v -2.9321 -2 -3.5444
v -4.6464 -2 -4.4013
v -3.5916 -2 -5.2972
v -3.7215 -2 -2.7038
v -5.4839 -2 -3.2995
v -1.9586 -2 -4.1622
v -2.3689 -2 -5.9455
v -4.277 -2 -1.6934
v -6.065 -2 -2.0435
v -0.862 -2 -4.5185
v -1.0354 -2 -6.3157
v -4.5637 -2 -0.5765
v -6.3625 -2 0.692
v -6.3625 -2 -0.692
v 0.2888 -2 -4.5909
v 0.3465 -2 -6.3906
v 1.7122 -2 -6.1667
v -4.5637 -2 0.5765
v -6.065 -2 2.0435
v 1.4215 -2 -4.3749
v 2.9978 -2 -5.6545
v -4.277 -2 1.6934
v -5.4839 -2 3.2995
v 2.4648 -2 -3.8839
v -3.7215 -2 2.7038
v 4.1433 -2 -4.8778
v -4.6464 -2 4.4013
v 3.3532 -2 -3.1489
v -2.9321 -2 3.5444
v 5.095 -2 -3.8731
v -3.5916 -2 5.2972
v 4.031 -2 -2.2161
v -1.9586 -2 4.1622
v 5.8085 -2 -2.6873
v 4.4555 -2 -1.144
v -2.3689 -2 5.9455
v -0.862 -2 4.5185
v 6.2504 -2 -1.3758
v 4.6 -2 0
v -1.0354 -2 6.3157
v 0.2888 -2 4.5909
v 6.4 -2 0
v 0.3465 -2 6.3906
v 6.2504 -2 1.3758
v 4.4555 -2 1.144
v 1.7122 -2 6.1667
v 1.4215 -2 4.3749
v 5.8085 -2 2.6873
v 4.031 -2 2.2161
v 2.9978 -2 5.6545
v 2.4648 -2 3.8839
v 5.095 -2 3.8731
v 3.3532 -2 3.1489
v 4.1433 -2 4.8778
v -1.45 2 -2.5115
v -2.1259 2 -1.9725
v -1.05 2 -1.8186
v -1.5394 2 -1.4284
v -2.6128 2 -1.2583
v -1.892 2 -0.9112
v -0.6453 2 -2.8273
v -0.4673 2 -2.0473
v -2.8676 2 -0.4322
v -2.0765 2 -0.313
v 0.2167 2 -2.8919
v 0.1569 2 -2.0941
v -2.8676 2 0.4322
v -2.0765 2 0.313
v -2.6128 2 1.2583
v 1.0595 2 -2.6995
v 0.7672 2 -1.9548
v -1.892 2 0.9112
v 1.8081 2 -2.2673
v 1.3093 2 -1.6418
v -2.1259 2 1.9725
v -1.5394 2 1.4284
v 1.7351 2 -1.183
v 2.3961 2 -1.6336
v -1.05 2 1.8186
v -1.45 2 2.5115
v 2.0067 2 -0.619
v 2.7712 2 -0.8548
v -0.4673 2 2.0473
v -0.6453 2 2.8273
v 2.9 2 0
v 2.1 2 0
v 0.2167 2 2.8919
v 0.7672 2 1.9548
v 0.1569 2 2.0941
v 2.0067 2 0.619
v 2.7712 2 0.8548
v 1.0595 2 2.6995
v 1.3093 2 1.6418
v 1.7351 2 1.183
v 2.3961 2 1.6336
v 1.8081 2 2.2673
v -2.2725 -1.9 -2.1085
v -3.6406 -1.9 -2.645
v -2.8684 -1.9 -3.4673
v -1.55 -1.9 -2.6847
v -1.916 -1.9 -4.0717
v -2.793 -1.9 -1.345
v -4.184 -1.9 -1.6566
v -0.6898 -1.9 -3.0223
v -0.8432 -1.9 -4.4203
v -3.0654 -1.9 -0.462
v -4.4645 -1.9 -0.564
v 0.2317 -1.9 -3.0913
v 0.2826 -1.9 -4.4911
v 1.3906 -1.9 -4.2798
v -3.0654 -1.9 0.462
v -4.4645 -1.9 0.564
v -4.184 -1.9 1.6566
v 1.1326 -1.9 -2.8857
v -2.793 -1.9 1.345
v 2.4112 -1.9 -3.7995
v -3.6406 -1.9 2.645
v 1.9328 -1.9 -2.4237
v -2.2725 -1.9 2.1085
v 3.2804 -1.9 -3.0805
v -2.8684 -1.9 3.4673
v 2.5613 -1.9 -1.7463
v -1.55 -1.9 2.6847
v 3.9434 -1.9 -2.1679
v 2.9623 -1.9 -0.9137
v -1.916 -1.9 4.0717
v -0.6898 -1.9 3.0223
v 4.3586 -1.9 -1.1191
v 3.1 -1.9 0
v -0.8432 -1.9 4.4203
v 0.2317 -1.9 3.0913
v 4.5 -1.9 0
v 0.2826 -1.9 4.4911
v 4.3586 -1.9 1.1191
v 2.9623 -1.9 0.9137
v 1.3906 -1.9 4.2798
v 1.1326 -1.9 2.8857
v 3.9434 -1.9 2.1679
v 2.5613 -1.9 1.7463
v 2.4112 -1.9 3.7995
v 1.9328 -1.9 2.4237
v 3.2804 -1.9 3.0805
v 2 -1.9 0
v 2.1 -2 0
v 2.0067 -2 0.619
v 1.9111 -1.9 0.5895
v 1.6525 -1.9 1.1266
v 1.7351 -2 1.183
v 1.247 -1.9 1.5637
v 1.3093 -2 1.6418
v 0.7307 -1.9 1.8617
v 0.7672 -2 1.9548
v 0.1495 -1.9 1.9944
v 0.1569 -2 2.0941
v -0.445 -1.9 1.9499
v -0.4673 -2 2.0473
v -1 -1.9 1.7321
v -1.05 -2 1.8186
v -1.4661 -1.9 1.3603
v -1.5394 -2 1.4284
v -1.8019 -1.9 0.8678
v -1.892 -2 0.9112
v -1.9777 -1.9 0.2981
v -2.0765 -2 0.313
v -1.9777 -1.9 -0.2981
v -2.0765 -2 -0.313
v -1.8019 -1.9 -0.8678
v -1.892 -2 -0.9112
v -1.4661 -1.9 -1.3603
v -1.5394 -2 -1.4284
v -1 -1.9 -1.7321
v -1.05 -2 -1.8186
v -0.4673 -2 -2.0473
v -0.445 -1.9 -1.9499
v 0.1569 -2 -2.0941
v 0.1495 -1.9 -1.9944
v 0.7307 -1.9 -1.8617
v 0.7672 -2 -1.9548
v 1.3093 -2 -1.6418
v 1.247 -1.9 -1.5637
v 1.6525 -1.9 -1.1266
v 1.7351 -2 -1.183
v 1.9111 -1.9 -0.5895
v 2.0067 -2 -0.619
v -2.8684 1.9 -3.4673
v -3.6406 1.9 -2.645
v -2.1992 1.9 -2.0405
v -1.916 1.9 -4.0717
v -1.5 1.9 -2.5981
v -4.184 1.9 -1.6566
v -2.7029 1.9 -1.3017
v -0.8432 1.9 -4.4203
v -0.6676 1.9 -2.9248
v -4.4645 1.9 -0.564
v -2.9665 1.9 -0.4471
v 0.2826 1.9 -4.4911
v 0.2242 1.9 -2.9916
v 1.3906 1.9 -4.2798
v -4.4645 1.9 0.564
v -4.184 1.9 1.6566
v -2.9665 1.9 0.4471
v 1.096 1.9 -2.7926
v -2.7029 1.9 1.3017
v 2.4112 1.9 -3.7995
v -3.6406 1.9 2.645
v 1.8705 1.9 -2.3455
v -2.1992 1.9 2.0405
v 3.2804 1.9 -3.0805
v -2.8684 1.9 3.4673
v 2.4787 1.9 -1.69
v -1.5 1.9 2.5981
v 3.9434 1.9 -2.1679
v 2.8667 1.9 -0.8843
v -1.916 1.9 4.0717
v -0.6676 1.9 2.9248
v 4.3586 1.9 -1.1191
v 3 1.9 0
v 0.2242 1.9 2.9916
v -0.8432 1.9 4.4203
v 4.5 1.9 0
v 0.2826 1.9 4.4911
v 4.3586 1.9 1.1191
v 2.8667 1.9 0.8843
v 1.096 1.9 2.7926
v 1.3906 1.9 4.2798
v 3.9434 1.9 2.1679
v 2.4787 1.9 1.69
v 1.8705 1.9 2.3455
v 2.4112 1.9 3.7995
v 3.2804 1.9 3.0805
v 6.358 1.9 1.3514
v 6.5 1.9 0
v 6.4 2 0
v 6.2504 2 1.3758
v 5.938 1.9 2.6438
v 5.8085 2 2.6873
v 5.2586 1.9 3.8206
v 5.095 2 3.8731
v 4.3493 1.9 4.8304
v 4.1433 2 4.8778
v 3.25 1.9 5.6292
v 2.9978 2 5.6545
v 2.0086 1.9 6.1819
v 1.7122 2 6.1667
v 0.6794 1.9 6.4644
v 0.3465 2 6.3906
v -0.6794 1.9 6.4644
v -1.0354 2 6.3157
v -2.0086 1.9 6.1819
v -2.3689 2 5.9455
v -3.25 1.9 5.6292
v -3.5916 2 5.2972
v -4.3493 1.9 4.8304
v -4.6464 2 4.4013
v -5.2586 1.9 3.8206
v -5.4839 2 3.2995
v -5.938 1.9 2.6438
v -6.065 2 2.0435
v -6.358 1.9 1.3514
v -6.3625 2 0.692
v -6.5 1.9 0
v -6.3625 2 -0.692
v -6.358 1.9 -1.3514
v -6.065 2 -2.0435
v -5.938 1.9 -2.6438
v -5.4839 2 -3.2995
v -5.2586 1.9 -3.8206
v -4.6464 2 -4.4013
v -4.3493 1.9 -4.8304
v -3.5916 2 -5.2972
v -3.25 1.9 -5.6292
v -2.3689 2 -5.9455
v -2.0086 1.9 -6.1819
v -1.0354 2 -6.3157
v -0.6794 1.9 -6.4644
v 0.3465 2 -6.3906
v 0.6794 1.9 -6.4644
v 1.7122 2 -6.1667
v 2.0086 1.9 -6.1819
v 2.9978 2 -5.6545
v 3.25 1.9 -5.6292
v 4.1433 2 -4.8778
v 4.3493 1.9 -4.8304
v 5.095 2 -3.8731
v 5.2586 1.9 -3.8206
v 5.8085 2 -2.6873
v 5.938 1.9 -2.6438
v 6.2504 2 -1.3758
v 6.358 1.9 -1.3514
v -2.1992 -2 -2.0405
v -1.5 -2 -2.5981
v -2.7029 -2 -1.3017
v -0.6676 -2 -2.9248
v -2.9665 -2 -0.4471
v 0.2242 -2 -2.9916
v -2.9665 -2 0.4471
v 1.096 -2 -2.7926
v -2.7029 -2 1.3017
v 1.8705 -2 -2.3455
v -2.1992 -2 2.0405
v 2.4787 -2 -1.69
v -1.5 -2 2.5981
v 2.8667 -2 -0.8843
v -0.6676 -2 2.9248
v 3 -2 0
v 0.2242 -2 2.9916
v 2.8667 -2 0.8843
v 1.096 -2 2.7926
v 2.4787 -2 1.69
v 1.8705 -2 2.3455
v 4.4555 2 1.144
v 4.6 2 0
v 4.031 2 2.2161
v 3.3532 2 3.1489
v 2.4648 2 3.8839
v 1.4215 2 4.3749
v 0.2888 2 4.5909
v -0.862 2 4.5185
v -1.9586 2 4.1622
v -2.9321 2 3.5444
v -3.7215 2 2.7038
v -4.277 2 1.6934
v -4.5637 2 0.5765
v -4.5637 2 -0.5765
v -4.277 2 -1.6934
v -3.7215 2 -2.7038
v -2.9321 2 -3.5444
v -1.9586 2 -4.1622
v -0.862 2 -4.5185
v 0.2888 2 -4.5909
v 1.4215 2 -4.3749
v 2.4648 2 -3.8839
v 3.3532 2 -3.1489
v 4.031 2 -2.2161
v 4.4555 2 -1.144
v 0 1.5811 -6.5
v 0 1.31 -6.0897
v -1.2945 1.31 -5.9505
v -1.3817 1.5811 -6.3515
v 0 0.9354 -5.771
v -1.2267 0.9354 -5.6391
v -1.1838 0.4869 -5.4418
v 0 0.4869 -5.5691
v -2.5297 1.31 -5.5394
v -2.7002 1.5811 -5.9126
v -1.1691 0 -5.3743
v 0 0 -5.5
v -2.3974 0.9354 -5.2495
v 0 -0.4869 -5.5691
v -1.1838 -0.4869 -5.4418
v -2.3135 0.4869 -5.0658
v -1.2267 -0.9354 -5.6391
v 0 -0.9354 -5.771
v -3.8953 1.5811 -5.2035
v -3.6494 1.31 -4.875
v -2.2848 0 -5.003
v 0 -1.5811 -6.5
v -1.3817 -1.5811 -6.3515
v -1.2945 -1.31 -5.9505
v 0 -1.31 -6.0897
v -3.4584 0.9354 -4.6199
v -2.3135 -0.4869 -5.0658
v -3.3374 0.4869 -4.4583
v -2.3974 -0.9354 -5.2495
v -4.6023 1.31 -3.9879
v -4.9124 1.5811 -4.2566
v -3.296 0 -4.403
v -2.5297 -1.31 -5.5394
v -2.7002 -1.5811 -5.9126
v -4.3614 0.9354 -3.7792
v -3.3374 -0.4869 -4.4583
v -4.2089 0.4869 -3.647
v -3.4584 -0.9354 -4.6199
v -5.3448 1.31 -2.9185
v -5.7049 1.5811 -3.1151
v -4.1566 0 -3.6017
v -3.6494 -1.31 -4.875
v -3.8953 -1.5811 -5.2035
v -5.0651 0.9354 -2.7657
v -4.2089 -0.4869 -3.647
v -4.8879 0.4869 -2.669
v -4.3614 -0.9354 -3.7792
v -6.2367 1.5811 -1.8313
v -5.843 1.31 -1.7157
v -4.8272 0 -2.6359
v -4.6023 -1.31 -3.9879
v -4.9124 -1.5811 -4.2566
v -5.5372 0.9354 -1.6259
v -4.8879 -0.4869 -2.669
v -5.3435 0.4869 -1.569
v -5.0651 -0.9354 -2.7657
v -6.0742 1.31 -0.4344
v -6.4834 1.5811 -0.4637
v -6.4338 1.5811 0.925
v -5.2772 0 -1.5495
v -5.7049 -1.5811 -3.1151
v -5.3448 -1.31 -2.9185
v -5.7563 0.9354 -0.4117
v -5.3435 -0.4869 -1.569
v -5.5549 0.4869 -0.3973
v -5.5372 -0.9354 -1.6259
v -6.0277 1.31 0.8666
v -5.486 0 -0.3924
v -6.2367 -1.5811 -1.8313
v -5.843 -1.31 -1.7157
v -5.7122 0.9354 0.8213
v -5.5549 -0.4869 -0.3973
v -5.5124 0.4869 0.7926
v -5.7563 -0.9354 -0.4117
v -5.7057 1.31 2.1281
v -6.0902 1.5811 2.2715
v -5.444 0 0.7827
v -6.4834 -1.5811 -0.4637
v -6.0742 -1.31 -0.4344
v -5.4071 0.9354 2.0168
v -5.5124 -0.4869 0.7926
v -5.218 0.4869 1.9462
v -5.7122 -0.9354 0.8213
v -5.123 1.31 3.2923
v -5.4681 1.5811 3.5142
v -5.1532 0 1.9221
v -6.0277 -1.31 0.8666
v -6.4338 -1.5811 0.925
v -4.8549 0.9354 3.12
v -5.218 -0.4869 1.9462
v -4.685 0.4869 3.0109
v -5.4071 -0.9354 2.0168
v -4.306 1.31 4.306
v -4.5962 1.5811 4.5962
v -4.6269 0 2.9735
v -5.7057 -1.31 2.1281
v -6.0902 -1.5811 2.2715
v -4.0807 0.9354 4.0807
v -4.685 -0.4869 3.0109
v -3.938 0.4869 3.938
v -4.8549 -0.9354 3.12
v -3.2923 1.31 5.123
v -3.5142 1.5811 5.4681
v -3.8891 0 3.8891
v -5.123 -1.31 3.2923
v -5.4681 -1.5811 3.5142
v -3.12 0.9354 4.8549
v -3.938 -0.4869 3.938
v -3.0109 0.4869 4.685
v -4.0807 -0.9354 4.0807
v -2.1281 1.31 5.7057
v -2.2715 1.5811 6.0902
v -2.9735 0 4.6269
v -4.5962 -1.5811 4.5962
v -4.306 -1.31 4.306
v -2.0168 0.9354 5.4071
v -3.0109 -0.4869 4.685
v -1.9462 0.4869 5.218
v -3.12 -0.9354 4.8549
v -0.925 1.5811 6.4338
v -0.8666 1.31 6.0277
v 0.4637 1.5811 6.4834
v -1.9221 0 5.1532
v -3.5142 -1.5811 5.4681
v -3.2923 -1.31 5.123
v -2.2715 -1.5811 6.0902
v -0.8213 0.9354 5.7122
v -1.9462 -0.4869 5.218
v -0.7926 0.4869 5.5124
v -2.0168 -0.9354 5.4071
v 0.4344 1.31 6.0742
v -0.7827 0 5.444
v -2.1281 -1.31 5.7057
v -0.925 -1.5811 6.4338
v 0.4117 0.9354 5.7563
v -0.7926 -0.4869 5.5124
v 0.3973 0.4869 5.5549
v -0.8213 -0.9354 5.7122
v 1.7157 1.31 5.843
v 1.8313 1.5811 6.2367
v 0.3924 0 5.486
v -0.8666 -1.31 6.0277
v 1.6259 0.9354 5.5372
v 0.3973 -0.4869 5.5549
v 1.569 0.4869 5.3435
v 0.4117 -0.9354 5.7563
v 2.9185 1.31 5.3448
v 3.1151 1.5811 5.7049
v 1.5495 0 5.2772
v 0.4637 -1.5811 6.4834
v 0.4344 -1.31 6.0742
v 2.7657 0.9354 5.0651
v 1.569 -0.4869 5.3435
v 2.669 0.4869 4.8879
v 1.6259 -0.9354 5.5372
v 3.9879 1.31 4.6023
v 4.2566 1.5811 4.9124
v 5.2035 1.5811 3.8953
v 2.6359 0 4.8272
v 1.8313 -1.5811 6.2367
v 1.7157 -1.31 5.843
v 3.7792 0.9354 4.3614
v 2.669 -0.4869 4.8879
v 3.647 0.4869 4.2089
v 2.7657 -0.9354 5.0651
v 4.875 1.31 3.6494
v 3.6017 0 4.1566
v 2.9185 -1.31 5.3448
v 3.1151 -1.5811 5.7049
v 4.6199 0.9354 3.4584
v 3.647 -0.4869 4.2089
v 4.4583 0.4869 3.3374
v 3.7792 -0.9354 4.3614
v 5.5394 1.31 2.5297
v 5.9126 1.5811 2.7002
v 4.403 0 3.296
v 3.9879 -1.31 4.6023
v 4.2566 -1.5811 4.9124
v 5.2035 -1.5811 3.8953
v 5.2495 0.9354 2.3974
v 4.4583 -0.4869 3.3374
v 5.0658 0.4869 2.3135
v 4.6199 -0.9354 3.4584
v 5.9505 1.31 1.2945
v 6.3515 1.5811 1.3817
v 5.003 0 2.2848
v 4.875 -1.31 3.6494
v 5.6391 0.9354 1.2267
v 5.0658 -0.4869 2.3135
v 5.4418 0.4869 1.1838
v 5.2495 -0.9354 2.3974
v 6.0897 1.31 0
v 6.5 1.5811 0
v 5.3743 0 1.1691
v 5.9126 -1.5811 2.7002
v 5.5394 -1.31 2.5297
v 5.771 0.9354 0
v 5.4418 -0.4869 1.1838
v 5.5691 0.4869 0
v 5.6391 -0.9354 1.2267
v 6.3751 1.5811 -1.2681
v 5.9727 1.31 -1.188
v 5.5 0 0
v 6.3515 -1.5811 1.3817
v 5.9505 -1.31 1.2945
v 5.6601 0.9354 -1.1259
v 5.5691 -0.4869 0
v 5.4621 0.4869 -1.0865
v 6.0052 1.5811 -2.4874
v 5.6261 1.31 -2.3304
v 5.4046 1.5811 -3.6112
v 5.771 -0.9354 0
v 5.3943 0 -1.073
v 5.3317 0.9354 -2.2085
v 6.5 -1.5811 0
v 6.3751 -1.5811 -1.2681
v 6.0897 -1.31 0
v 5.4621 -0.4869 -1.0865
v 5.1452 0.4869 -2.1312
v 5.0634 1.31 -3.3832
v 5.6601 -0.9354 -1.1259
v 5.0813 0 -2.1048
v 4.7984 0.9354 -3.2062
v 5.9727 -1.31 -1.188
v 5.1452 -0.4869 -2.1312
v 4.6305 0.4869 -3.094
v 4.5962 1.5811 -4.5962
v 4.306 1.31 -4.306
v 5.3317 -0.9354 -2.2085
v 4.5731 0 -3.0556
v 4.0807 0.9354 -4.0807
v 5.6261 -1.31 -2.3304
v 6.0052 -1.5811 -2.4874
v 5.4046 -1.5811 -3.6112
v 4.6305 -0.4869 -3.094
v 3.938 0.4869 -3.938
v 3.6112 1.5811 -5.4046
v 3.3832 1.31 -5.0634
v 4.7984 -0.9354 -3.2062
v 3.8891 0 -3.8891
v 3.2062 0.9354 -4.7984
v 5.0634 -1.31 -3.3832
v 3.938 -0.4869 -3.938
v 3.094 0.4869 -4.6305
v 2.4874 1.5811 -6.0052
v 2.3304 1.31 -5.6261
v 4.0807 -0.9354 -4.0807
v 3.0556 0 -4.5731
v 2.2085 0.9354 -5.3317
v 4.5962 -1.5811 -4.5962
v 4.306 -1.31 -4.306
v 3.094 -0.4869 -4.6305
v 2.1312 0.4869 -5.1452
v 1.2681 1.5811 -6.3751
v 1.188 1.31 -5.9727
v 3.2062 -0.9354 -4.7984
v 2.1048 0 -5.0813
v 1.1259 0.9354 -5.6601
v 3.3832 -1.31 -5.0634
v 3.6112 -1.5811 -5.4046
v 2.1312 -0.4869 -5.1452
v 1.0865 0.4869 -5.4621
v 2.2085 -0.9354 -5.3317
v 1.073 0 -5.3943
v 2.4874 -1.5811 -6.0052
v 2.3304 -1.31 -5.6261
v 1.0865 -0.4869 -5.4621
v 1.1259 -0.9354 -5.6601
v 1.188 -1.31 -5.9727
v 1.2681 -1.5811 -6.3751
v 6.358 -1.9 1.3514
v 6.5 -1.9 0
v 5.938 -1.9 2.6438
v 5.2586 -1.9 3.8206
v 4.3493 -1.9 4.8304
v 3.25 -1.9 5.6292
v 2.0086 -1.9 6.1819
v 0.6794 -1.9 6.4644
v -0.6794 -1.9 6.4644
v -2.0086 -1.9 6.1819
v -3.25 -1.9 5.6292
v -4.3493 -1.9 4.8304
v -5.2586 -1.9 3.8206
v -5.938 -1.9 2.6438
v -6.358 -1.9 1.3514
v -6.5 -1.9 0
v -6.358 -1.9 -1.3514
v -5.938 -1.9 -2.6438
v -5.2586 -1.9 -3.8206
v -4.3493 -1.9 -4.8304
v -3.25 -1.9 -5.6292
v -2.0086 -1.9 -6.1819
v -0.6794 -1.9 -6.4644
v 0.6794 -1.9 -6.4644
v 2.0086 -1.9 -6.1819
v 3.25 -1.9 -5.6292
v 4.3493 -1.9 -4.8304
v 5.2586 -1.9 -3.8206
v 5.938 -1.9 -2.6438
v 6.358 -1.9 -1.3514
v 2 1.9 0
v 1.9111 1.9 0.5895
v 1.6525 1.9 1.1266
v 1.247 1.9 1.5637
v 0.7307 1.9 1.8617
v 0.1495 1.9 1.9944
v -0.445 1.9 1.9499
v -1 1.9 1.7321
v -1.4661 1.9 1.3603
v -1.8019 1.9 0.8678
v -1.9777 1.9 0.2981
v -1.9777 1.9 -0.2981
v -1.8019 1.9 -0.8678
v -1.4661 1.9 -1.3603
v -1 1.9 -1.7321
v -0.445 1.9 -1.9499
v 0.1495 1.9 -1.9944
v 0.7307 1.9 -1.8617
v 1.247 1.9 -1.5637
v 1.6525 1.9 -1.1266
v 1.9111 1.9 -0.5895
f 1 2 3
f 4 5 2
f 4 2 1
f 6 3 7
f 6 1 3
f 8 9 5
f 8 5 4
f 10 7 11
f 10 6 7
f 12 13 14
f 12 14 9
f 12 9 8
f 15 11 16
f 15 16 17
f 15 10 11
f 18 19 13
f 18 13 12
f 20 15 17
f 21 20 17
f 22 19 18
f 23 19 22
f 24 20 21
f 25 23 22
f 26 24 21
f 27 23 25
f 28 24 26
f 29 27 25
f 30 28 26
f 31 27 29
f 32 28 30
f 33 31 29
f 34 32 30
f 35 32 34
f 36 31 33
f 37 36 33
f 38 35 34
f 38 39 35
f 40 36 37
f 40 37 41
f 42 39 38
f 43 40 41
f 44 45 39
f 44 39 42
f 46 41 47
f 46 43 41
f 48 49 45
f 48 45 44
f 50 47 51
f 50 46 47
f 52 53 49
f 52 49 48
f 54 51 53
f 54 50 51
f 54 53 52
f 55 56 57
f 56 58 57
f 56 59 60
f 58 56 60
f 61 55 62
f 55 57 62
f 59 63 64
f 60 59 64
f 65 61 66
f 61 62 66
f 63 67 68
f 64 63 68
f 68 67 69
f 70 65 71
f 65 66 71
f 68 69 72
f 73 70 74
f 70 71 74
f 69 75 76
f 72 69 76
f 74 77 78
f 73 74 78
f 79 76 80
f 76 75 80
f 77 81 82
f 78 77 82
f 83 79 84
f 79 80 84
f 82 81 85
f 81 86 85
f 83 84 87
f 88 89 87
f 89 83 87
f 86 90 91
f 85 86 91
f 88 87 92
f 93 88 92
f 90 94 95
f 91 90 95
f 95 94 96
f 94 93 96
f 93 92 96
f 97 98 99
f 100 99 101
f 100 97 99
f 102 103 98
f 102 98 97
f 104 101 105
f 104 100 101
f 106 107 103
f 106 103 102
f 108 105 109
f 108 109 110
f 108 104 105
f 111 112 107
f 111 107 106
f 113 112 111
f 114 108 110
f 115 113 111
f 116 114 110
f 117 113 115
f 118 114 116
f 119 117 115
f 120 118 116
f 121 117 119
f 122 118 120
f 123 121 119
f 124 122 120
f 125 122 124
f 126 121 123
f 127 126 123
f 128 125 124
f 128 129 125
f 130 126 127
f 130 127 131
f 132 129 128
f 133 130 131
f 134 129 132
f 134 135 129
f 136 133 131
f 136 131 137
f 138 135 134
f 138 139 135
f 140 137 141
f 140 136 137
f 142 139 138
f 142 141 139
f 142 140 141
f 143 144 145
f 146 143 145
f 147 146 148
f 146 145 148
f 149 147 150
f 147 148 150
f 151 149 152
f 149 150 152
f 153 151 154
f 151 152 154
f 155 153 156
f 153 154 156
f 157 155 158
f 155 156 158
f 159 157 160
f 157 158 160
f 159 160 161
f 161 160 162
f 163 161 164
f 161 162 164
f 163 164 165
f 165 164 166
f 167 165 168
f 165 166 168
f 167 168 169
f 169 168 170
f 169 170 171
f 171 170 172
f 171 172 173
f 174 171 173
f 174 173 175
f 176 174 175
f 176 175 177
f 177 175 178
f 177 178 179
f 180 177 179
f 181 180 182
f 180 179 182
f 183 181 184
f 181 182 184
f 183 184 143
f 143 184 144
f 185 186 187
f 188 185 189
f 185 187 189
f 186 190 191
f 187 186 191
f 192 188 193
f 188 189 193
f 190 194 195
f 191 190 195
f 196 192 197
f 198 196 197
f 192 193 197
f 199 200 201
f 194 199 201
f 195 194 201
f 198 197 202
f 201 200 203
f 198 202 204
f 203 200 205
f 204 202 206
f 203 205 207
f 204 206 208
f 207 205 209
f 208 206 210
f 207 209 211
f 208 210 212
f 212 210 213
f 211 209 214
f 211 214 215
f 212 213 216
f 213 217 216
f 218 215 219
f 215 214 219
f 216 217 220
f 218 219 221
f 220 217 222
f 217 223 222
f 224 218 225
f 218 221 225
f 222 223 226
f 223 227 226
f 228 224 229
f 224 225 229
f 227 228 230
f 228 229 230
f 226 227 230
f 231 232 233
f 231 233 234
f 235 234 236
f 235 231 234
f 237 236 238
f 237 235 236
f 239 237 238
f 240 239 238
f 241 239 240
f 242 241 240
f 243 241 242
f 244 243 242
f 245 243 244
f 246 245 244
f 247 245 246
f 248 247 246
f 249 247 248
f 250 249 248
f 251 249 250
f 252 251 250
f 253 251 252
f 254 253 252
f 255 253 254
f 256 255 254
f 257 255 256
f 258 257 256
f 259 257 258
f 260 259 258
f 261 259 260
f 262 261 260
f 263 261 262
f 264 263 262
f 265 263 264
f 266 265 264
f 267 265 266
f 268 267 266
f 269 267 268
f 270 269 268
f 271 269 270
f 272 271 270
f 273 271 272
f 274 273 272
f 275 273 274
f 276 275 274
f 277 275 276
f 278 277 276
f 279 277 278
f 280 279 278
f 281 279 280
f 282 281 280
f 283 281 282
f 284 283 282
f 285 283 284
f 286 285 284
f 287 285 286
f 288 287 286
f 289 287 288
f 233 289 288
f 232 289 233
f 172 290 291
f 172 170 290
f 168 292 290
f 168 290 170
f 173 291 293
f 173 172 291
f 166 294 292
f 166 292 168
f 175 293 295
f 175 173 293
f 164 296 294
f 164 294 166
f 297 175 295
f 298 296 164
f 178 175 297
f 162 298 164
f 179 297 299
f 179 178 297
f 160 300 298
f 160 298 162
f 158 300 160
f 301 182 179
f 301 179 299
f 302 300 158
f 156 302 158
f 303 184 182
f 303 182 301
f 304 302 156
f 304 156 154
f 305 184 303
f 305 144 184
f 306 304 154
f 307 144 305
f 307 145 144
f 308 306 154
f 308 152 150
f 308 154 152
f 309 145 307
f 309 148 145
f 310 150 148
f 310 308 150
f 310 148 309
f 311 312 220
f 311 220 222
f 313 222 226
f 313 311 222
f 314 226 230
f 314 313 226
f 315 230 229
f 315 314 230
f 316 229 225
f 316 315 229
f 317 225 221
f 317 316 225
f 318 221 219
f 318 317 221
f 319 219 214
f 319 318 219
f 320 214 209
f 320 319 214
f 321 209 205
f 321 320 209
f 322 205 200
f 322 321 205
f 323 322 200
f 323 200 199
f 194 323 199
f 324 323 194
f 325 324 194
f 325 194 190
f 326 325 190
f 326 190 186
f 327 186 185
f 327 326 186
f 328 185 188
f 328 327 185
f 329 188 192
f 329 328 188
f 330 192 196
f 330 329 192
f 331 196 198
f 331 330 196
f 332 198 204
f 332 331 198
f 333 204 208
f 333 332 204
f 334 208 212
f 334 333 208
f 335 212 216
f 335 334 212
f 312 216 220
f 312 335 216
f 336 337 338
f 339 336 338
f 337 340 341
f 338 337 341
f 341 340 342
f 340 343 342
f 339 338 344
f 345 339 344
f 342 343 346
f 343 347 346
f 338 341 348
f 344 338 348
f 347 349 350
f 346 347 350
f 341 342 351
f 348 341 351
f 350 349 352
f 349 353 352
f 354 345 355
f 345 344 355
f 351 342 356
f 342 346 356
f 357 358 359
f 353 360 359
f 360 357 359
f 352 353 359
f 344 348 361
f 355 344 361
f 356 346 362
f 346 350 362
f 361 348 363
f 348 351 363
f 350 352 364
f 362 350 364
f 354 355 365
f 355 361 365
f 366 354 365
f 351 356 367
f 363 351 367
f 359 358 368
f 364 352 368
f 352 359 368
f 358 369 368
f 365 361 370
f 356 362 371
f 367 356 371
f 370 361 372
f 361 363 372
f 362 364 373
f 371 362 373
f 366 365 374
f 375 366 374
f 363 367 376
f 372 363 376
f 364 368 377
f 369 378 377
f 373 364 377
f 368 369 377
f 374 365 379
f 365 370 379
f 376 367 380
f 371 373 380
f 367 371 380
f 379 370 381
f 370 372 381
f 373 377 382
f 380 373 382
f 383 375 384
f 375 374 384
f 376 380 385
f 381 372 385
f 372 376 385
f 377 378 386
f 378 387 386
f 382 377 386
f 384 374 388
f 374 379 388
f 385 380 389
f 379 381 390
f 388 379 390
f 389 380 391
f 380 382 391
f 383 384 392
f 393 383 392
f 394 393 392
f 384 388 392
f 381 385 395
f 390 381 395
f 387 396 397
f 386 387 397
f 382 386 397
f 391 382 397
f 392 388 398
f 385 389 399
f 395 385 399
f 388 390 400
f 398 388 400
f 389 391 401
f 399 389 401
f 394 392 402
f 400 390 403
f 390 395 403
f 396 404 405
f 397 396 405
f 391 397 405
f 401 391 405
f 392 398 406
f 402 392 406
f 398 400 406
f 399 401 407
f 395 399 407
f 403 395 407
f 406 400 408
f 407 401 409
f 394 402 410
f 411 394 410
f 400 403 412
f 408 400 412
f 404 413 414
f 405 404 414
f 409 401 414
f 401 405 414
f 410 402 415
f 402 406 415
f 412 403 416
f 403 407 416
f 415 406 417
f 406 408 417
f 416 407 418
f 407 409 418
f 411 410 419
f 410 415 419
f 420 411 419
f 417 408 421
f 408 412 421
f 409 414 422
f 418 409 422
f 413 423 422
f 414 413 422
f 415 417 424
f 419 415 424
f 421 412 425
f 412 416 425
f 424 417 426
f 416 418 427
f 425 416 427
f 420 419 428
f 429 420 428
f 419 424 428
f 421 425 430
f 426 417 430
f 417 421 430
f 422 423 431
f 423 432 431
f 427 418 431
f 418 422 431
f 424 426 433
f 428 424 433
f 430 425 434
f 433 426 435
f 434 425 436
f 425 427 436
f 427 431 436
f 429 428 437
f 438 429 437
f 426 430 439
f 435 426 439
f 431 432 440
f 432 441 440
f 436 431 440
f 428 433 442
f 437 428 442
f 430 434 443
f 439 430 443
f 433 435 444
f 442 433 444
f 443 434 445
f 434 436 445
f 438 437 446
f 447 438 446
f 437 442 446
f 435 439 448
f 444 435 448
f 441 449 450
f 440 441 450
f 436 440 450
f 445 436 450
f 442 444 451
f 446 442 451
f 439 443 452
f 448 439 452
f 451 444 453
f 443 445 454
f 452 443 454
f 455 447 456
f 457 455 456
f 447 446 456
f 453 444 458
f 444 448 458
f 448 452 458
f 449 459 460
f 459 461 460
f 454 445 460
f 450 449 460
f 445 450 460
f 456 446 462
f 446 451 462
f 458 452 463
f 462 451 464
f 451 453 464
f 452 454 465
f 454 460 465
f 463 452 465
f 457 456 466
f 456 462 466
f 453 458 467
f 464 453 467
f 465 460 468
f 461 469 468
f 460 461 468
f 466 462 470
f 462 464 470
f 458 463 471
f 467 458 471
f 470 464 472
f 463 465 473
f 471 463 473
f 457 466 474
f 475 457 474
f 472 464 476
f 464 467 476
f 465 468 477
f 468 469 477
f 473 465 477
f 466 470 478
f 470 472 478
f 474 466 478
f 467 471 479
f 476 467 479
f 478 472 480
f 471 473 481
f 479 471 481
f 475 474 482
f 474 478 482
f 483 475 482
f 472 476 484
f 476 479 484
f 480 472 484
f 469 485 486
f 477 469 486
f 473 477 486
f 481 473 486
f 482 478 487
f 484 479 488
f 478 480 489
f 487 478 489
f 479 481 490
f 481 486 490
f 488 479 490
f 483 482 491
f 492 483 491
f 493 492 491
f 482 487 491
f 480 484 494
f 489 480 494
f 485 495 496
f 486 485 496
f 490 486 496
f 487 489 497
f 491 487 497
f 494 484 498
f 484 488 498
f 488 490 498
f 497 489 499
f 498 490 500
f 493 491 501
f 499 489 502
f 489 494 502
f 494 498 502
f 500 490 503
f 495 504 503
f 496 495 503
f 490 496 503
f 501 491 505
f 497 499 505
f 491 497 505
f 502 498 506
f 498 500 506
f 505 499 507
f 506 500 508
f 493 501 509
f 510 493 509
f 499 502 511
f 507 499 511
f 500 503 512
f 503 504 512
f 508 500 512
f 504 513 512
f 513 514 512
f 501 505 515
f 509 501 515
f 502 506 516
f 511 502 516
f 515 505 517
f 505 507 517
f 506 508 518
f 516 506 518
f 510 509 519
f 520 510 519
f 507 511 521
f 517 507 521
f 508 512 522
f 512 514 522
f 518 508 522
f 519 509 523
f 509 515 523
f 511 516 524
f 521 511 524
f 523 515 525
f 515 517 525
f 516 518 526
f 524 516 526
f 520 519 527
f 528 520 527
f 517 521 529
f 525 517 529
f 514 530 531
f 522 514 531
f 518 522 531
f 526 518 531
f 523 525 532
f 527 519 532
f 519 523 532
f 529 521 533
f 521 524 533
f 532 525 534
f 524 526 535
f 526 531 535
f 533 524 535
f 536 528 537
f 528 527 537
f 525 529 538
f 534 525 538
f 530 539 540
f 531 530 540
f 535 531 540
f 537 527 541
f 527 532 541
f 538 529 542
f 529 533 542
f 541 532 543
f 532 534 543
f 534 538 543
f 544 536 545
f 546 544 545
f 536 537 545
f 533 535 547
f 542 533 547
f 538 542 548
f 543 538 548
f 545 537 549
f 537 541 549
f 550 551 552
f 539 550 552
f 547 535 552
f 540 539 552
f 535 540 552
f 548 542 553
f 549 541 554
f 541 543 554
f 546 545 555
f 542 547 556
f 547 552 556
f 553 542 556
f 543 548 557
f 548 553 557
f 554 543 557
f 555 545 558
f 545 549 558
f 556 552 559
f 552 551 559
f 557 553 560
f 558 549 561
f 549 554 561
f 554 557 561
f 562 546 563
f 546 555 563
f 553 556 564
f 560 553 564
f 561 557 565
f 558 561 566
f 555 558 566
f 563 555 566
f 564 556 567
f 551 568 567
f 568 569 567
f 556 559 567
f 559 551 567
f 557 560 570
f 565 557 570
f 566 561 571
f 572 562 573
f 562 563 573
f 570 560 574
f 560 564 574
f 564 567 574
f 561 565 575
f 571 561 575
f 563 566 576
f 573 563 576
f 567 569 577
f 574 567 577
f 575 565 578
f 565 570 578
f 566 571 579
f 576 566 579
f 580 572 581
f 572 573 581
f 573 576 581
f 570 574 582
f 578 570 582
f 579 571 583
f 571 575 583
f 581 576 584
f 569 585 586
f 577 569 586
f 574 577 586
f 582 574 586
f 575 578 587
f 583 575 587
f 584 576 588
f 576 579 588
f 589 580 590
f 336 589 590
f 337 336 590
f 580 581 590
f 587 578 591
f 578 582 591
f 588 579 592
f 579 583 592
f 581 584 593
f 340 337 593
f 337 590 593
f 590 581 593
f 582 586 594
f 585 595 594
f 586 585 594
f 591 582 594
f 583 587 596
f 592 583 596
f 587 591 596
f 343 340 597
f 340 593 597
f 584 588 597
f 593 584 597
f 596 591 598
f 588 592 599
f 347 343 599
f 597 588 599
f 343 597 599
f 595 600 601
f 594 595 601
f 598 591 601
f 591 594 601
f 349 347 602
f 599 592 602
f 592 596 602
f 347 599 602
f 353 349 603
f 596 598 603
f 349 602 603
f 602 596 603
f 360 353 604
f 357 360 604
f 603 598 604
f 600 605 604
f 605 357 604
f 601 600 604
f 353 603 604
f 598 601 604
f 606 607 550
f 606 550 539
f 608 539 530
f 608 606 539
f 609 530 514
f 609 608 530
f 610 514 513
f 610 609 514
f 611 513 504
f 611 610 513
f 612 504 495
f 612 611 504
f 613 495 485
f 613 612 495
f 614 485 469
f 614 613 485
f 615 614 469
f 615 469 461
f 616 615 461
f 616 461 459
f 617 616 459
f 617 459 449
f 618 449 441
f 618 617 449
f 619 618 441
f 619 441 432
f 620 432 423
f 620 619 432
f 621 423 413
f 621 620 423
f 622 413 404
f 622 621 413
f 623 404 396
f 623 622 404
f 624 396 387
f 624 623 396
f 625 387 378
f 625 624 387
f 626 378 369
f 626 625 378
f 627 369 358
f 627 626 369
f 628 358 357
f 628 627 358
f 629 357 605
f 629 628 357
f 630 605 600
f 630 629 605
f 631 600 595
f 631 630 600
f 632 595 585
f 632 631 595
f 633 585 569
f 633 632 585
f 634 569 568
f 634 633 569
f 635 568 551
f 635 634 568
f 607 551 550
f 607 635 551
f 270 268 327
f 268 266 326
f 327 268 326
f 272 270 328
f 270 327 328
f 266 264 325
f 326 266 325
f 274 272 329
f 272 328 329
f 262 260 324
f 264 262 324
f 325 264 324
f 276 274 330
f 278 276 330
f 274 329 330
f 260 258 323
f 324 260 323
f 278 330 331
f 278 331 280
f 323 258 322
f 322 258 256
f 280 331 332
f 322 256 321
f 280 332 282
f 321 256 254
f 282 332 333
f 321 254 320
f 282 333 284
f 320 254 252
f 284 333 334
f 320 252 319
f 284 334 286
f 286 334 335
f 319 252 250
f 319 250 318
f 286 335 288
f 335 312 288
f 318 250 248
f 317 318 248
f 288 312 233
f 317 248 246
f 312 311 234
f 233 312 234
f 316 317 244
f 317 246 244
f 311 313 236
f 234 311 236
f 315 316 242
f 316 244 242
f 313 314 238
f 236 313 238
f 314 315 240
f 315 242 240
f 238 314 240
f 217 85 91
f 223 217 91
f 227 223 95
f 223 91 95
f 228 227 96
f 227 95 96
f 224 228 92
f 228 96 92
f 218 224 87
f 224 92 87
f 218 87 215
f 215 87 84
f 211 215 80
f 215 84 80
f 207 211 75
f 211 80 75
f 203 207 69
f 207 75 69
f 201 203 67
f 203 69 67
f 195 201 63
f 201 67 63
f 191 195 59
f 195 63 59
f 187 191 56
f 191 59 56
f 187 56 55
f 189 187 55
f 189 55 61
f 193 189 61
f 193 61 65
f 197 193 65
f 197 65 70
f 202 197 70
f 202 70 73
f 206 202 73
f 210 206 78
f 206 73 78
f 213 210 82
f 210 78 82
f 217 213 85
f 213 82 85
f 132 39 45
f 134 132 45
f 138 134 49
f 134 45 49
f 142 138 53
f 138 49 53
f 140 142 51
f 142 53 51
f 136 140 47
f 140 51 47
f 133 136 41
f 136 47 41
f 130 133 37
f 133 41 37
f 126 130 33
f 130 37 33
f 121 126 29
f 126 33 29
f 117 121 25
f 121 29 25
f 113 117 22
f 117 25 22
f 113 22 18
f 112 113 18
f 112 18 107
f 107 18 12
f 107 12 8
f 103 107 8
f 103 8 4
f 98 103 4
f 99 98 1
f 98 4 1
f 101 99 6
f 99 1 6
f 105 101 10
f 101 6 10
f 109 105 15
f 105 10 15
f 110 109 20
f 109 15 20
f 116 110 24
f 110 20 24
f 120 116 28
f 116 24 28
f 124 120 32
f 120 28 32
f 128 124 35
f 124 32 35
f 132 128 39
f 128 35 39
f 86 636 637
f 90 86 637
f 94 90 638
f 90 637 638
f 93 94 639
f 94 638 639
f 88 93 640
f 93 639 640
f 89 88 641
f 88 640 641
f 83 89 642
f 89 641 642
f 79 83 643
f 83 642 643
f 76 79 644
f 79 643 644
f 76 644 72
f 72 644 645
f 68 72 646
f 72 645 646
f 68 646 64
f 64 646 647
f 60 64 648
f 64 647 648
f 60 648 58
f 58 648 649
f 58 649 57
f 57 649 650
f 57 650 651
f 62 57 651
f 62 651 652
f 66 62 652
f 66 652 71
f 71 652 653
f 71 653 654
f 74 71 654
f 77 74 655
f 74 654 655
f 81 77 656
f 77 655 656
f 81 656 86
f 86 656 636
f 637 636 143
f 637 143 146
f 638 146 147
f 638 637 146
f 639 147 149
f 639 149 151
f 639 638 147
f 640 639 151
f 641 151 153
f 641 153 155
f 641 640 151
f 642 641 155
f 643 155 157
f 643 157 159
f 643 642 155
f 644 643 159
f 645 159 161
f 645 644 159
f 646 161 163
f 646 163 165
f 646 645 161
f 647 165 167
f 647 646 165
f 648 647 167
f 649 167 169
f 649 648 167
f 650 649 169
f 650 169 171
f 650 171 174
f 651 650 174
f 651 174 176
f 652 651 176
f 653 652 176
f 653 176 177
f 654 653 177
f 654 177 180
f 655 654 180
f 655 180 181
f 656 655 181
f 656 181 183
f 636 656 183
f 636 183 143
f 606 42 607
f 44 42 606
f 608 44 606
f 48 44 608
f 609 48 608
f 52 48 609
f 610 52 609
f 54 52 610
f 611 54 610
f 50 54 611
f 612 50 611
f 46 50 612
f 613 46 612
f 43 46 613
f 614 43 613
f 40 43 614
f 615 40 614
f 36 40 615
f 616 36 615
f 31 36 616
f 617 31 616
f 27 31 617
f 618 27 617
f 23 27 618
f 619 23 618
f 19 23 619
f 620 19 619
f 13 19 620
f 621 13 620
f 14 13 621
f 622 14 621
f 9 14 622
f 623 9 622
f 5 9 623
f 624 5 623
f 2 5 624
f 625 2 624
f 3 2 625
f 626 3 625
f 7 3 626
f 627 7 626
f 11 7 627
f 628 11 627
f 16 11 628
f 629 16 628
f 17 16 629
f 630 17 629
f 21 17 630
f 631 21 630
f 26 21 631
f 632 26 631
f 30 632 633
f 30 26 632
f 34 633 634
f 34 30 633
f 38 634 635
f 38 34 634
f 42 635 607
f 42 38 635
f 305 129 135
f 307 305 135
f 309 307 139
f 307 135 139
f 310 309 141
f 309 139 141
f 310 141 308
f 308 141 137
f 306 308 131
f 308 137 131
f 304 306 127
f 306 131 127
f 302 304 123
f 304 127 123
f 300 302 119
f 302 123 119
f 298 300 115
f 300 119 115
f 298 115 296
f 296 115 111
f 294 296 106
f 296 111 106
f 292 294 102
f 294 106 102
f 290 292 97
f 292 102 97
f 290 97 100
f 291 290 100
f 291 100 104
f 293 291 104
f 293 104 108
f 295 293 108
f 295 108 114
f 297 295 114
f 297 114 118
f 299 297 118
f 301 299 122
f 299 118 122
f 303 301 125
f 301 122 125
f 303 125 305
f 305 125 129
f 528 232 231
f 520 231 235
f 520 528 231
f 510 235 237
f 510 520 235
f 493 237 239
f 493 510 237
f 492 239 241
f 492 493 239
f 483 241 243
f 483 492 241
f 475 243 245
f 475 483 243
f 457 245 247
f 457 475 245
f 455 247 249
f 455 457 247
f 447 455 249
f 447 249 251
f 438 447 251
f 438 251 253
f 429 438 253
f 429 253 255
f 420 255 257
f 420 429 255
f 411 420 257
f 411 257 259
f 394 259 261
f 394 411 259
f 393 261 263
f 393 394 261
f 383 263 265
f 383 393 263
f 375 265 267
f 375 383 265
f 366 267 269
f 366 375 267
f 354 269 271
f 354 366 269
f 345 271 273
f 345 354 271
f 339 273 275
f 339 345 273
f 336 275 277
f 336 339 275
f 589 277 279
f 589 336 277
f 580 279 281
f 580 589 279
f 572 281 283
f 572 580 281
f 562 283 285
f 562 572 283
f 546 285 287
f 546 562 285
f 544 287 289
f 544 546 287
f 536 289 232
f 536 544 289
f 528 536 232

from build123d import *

# Parameters (mm, degrees)
F0_R     = 4.5
F0_R_2   = 3
F1_DEPTH = 1.9
F0_R_3   = 6.5
F0_R_4   = 2
F2_DEPTH = 2
F3_R     = 1.75
F5_SIZE  = 0.09999


# Not quite as in the source:
# - a fillet or chamfer is up to 0.001 mm smaller than in the source, because OpenCascade refuses the exact size


with BuildPart() as f1:
    # F0 (on Front) → F1 (new body, symmetric)
    with BuildSketch(Plane.XZ):
        Circle(F0_R)
        Circle(F0_R_2, mode=Mode.SUBTRACT)
    extrude(amount=F1_DEPTH, both=True)

    # F0 (on Front) → F2 (join, symmetric)
    with BuildSketch(Plane.XZ):
        Circle(F0_R_3)
        Circle(F0_R, mode=Mode.SUBTRACT)
        Circle(F0_R_2)
        Circle(F0_R_4, mode=Mode.SUBTRACT)
    extrude(amount=F2_DEPTH, both=True)

    # F4: sweep along a path in F4_path
    with BuildLine(Plane(origin=(6.5, -2, 0), x_dir=(0, 0, -1), z_dir=(0, 1, 0))) as f4_path:
        CenterArc((0, 6.5), 6.5, 0, 360)
    # F3 (on Right) → F4 (sweep, cut)
    with BuildSketch(Plane.YZ):
        with Locations((0, 7.25)):
            Circle(F3_R)
    sweep(path=f4_path.line, mode=Mode.SUBTRACT)

    # F5 (size 0.1 in the source; OpenCascade refuses exactly that, so slightly less here)
    f5_edges = [f1.edges().sort_by_distance(p)[0] for p in [
        (-6.5, -2, 0),
        (-4.5, -2, 0),
        (-3, -1.9, 0),
        (-2, -2, 0),
        (-2, 2, 0),
        (-3, 2, 0),
        (-4.5, 2, 0),
        (-6.5, 2, 0),
    ]]
    chamfer(f5_edges, length=F5_SIZE)


solid = f1.part
